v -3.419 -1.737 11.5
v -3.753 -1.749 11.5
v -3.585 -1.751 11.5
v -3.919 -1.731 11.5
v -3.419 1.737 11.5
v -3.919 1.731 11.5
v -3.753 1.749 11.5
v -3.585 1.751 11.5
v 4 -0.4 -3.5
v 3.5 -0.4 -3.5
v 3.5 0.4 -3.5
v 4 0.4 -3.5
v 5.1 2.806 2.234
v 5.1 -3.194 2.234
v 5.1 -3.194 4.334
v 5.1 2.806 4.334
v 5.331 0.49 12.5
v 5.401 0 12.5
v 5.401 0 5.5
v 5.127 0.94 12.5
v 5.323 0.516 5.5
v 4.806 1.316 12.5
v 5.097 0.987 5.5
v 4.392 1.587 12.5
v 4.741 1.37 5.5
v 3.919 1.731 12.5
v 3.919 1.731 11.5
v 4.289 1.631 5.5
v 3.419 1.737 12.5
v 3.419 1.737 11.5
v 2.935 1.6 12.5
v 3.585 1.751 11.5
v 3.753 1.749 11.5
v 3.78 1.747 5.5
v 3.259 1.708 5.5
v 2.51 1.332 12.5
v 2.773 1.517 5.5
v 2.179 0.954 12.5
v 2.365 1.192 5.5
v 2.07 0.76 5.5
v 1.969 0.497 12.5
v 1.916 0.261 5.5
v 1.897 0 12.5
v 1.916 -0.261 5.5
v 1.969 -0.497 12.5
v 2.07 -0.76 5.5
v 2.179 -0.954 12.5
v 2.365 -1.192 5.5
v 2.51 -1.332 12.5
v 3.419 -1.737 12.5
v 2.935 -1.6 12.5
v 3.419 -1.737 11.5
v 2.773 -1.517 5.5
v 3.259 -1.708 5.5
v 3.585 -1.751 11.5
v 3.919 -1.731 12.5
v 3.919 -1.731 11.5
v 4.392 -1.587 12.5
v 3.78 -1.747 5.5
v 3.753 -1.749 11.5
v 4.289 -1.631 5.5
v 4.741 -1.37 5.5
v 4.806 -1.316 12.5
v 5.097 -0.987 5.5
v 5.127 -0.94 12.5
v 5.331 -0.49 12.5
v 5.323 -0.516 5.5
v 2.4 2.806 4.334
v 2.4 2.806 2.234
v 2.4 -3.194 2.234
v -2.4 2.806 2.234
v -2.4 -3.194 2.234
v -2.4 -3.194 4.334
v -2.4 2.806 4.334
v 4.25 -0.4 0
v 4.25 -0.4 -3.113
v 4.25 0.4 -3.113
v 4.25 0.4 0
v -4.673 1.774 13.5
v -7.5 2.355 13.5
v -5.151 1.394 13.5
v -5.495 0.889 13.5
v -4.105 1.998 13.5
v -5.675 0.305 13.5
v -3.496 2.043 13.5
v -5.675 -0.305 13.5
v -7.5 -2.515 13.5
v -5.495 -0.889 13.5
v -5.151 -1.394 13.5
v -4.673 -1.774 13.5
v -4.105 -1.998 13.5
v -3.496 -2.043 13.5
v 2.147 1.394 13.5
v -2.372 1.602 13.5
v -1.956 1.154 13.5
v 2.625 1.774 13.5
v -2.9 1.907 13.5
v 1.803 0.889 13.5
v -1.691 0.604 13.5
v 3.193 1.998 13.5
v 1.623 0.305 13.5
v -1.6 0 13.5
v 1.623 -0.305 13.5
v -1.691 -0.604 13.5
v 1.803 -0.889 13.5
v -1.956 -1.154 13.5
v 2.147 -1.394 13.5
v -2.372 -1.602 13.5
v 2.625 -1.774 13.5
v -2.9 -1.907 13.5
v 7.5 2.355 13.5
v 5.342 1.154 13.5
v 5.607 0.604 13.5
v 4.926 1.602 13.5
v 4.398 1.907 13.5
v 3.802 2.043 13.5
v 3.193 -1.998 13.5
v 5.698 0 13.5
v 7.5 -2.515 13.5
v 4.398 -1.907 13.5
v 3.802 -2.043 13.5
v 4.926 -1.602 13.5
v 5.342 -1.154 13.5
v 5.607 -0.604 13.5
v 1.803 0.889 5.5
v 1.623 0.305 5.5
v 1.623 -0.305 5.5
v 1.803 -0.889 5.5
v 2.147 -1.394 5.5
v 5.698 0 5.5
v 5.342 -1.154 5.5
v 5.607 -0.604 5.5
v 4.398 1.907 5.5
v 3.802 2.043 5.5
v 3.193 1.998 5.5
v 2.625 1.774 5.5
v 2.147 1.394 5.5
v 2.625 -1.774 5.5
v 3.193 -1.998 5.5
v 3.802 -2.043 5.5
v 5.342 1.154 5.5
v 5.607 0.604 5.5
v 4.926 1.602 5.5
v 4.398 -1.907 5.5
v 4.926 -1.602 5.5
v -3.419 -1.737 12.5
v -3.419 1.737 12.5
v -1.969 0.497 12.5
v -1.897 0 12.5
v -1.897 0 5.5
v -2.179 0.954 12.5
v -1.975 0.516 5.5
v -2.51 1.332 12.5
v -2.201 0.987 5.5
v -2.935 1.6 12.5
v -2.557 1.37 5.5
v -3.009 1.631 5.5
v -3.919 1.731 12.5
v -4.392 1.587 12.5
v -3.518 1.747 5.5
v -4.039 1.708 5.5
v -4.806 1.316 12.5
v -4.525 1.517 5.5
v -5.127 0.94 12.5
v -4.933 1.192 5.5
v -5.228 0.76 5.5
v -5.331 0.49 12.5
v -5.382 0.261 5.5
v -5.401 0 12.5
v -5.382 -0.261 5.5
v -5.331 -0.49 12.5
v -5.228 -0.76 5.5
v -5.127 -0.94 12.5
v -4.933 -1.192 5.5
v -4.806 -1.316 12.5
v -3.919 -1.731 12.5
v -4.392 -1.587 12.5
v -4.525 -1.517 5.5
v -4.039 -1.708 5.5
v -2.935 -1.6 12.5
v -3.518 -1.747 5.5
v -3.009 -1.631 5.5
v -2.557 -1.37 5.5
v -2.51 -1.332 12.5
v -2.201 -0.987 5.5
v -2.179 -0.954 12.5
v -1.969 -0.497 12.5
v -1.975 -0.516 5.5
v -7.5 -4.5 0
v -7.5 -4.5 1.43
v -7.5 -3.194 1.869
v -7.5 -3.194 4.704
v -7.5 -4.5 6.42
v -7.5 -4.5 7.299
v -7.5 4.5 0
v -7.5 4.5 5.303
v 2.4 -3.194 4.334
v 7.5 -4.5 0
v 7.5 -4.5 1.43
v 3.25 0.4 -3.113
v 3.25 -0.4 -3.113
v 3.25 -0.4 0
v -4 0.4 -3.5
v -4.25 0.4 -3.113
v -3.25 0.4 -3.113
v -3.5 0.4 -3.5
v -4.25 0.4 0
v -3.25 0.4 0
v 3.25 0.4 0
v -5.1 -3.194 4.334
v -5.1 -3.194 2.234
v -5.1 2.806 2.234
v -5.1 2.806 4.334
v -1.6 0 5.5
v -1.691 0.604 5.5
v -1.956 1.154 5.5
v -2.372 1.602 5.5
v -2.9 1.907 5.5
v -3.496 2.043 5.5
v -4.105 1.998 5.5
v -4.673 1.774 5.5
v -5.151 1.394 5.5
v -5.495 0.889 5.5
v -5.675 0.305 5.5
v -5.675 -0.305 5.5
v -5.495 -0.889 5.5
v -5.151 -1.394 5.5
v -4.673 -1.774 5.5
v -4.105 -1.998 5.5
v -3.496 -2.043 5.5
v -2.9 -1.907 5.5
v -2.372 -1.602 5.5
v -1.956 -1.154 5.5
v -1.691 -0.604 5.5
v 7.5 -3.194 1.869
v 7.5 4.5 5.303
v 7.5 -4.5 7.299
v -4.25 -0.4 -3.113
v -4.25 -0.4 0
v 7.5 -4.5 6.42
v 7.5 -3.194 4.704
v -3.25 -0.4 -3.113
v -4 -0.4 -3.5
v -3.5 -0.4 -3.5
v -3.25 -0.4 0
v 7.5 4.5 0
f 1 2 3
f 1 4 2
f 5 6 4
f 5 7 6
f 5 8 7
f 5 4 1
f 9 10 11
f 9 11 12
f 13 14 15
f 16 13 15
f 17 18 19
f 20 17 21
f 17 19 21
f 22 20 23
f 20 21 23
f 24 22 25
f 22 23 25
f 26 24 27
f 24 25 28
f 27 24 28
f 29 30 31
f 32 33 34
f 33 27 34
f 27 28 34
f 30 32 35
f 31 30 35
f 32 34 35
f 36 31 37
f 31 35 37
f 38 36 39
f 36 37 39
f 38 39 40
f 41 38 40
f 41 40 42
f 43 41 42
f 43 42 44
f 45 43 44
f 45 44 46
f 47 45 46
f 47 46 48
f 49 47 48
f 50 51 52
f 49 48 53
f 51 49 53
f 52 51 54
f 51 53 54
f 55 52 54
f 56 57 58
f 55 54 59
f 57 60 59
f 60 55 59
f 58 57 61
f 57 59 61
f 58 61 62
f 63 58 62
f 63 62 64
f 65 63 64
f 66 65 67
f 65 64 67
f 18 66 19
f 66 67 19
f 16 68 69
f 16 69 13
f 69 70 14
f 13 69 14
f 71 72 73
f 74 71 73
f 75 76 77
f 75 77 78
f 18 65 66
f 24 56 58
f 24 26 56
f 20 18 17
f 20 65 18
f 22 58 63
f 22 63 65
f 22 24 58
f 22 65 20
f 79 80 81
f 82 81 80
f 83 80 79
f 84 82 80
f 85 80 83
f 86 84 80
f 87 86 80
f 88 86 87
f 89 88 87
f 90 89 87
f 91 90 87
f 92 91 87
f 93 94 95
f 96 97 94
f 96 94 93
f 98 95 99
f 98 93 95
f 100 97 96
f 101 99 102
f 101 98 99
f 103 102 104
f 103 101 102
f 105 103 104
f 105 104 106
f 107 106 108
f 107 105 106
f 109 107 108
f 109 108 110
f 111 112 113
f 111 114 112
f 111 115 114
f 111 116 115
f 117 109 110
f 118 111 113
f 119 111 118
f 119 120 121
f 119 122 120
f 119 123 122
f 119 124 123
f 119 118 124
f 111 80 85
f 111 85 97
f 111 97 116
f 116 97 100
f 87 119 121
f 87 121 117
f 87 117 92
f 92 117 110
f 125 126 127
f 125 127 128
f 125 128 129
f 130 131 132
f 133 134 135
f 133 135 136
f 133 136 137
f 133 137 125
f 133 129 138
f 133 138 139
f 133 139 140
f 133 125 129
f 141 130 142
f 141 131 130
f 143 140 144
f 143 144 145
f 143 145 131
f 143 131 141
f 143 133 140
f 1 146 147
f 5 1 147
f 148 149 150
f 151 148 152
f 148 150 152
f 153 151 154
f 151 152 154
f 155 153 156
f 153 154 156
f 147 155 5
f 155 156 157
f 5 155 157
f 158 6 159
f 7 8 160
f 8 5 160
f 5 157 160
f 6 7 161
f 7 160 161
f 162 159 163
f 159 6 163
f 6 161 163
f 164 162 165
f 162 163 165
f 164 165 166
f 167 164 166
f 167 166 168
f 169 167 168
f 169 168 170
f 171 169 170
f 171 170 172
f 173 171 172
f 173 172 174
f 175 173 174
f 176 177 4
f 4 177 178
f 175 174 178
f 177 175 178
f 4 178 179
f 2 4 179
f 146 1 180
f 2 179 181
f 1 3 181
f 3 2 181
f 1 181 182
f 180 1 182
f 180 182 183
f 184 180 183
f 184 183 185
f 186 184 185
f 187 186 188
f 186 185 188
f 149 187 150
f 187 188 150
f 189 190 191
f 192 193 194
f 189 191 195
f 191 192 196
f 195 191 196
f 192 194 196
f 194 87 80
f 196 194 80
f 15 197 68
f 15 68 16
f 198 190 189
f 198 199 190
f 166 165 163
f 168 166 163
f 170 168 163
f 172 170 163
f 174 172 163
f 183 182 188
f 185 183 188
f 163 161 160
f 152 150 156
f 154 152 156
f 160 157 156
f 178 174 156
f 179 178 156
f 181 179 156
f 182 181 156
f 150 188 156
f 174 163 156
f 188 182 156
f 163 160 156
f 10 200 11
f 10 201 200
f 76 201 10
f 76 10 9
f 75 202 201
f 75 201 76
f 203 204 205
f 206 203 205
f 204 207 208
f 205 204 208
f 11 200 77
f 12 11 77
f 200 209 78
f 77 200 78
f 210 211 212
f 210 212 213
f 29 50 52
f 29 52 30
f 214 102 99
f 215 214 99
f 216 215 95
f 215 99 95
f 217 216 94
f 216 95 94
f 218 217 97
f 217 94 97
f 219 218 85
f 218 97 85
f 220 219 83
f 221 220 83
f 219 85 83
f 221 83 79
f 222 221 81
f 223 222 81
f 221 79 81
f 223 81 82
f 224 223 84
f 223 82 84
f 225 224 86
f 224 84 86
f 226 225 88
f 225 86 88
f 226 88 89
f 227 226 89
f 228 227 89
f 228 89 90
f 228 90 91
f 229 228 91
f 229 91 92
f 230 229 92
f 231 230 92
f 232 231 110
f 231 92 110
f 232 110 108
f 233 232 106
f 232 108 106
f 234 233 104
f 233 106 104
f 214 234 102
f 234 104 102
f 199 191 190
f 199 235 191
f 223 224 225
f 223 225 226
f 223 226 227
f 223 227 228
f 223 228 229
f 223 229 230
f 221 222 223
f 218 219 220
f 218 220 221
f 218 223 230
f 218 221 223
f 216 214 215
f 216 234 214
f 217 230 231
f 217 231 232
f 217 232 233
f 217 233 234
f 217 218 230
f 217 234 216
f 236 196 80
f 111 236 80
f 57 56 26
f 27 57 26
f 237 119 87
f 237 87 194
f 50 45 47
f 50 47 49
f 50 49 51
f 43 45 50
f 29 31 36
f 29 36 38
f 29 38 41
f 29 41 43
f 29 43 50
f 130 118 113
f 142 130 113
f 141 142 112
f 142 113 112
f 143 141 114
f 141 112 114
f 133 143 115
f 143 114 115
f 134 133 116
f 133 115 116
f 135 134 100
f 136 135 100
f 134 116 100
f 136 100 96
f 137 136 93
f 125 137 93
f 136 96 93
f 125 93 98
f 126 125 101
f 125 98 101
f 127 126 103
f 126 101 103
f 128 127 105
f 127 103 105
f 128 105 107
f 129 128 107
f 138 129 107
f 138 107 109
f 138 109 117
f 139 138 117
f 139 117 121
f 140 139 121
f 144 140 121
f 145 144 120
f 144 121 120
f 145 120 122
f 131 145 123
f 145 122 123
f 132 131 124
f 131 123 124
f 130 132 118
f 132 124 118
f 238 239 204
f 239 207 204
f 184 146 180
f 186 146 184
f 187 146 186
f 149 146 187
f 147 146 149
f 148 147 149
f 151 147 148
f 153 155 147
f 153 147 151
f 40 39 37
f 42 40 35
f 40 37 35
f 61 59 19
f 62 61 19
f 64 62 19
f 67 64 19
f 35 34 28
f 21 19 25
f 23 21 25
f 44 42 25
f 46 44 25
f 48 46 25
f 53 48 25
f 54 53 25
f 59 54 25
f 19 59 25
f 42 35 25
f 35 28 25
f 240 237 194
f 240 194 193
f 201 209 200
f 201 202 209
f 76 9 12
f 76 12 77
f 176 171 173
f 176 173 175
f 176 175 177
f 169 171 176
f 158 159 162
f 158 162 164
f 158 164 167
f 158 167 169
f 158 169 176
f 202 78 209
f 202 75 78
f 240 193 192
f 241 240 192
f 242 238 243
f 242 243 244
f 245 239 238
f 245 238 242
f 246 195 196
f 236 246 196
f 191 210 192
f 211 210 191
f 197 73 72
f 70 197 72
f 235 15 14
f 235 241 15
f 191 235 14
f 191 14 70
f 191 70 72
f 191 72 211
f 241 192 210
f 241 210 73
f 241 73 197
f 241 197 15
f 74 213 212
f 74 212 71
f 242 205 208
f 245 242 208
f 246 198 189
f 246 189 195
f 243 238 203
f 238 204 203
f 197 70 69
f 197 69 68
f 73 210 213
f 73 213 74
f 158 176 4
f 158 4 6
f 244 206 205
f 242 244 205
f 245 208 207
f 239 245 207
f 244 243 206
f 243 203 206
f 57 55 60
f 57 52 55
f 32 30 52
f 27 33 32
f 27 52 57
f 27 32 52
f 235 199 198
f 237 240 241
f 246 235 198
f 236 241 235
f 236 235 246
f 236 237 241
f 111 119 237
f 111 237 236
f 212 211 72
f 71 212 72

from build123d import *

# Parameters (mm, degrees)
F1_DEPTH  = 7.5
F2_W      = 2.7
F2_H      = 2.1
F3_DEPTH  = 6
F4_R      = 2.048943
F5_DEPTH  = 8
F6_R      = 1.752095
F7_DEPTH  = 7
F8_W      = 0.5
F8_H      = 3.777778
F9_DEPTH  = 1
F11_DEPTH = 0.4


with BuildPart() as f1:
    # F0 (on Right) → F1 (new body, symmetric)
    with BuildSketch(Plane.YZ):
        Polygon((-4.5, 1.43037), (-4.5, 0), (4.5, 0), (4.5, 5.302561), (2.354715, 13.5), (-2.515464, 13.5), (-4.5, 7.298536), (-4.5, 6.420307), (-3.194096, 4.703769), (-3.194096, 1.869484), align=None)
    extrude(amount=F1_DEPTH, both=True)

    # F2 (on face) → F3 (cut)
    with BuildSketch(Plane.XZ.offset(3.194096)):
        with Locations((-3.75, 3.283744)):
            Rectangle(F2_W, F2_H)
        with Locations((3.75, 3.283744)):
            Rectangle(F2_W, F2_H)
    extrude(amount=-F3_DEPTH, mode=Mode.SUBTRACT)

    # F4 (on face) → F5 (cut)
    with BuildSketch(Plane.XY.offset(13.5)):
        with Locations((-3.649004, 0)):
            Circle(F4_R)
        with Locations((3.649004, 0)):
            Circle(F4_R)
    extrude(amount=-F5_DEPTH, mode=Mode.SUBTRACT)


with BuildPart() as f7:
    # F6 (on face) → F7 (new body)
    with BuildSketch(Plane.XY.offset(5.5)):
        with Locations((3.649004, 0)):
            Circle(F6_R)
        with Locations((-3.649004, 0)):
            Circle(F6_R)
    extrude(amount=F7_DEPTH)

    # F8 (on face) → F9 (cut)
    with BuildSketch(Plane.XY.offset(12.5)):
        with Locations((-3.668878, -0.014657)):
            Rectangle(F8_W, F8_H)
        with Locations((3.668878, -0.014657)):
            Rectangle(F8_W, F8_H)
    extrude(amount=-F9_DEPTH, mode=Mode.SUBTRACT)


with BuildPart() as f11:
    # F10 (on Front) → F11 (new body, symmetric)
    with BuildSketch(Plane.XZ):
        Polygon((-3.25, 0), (-4.25, 0), (-4.25, -3.113227), (-4, -3.5), (-3.5, -3.5), (-3.25, -3.113227), align=None)
        Polygon((3.25, -3.113227), (3.5, -3.5), (4, -3.5), (4.25, -3.113227), (4.25, 0), (3.25, 0), align=None)
    extrude(amount=F11_DEPTH, both=True)


solid = Compound([f1.part, f7.part, f11.part])
